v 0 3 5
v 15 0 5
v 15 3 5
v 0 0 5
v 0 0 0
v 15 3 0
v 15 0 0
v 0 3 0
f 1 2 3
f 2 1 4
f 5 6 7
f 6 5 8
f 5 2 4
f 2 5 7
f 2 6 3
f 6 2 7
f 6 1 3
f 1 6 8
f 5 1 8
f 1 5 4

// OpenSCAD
// Generated by SolidPython 1.0.1 on 2020-07-29 00:46:55


cube(size = [15, 3, 5]);
/***********************************************
*********      SolidPython code:      **********
************************************************
 
# import packages: SolidPython
from solid import *
from solid.utils import *
from itertools import chain, combinations, permutations


class Resize:

    def __init__(self, scad_file):
        self.scad_file = scad_file
        #self.scad_file = import_scad(scad_file)
        # cone/cylinder param:
        self.r1 = 0
        self.r2 = 0
        self.h = 0
        # rectangular prism param:
        self.w = 0
        self.l = 0
        # ellipse param:
        self.r = 0

    # import OpenScad code (file name corresponds to shape)


    # classify shape + parameters
    def assign(self, param1, param2, param3):
        if self.scad_file == 'cone.scad':
            self.r1 = param1
            self.r2 = param2
            self.h = param3
        elif self.scad_file == 'cylinder.scad':
            self.r1 = param1
            self.r2 = param2
            self.h = param3
        elif self.scad_file == 'rectangularPrism.scad':
            self.h = param1
            self.l = param2
            self.w = param3
        else:
            self.r = param1
            self.h = param2

    # resize parameters
    def iterate(self):
        x = range(3, 20, 2)
        i = 1
        if self.scad_file == 'cone.scad':
            tempList = list(permutations(x, 2))
            for temp in tempList:
                param1 = temp[0]
                param2 = temp[1]
                filepath = 'produced_scad_files/' + 'cone' + str(param1) + '_' + str(param2) + '_' + '.scad'
                scad_render_to_file(cylinder(h=param1, r1=param2, r2=0), filepath)

        elif self.scad_file == 'cylinder.scad':
            tempList = list(permutations(x, 3))
            for temp in tempList:
                param1 = temp[0]
                param2 = temp[1]
                filepath = 'produced_scad_files/' + 'cylinder' + str(param1) + '_' + str(param2) + '_' + '.scad'
                scad_render_to_file(cylinder(h=param1, r1=param2, r2=param2), filepath)

        elif self.scad_file == 'rectangularPrism.scad':
            tempList = list(permutations(x, 3))
            for temp in tempList:
                param1 = temp[0]
                param2 = temp[1]
                param3 = temp[2]
                filepath = 'produced_scad_files/' + 'rectangularPrism' + str(param1) + '_' + str(param2) + '_' + str(
                    param3) + '.scad'
                scad_render_to_file(cube(size=(param1, param2, param3)), filepath)

        elif self.scad_file == 'ellipse.scad':
            tempList = list(permutations(x, 4))
            for temp in tempList:
                param1 = temp[0]
                param2 = temp[1]
                param3 = temp[2]
                param4 = temp[3]
                filepath = 'produced_scad_files/' + 'ellipse' + str(param1) + '_' + str(param2) + '_' + str(param3) + '_' + str(param4) + '.scad'
                scad_render_to_file(scale([param1, param2, param3])(sphere(r=param4)), filepath)

    def render_to_scadfile(self):
        scad_render_to_file(scad, 'example.scad') 
 
************************************************/
